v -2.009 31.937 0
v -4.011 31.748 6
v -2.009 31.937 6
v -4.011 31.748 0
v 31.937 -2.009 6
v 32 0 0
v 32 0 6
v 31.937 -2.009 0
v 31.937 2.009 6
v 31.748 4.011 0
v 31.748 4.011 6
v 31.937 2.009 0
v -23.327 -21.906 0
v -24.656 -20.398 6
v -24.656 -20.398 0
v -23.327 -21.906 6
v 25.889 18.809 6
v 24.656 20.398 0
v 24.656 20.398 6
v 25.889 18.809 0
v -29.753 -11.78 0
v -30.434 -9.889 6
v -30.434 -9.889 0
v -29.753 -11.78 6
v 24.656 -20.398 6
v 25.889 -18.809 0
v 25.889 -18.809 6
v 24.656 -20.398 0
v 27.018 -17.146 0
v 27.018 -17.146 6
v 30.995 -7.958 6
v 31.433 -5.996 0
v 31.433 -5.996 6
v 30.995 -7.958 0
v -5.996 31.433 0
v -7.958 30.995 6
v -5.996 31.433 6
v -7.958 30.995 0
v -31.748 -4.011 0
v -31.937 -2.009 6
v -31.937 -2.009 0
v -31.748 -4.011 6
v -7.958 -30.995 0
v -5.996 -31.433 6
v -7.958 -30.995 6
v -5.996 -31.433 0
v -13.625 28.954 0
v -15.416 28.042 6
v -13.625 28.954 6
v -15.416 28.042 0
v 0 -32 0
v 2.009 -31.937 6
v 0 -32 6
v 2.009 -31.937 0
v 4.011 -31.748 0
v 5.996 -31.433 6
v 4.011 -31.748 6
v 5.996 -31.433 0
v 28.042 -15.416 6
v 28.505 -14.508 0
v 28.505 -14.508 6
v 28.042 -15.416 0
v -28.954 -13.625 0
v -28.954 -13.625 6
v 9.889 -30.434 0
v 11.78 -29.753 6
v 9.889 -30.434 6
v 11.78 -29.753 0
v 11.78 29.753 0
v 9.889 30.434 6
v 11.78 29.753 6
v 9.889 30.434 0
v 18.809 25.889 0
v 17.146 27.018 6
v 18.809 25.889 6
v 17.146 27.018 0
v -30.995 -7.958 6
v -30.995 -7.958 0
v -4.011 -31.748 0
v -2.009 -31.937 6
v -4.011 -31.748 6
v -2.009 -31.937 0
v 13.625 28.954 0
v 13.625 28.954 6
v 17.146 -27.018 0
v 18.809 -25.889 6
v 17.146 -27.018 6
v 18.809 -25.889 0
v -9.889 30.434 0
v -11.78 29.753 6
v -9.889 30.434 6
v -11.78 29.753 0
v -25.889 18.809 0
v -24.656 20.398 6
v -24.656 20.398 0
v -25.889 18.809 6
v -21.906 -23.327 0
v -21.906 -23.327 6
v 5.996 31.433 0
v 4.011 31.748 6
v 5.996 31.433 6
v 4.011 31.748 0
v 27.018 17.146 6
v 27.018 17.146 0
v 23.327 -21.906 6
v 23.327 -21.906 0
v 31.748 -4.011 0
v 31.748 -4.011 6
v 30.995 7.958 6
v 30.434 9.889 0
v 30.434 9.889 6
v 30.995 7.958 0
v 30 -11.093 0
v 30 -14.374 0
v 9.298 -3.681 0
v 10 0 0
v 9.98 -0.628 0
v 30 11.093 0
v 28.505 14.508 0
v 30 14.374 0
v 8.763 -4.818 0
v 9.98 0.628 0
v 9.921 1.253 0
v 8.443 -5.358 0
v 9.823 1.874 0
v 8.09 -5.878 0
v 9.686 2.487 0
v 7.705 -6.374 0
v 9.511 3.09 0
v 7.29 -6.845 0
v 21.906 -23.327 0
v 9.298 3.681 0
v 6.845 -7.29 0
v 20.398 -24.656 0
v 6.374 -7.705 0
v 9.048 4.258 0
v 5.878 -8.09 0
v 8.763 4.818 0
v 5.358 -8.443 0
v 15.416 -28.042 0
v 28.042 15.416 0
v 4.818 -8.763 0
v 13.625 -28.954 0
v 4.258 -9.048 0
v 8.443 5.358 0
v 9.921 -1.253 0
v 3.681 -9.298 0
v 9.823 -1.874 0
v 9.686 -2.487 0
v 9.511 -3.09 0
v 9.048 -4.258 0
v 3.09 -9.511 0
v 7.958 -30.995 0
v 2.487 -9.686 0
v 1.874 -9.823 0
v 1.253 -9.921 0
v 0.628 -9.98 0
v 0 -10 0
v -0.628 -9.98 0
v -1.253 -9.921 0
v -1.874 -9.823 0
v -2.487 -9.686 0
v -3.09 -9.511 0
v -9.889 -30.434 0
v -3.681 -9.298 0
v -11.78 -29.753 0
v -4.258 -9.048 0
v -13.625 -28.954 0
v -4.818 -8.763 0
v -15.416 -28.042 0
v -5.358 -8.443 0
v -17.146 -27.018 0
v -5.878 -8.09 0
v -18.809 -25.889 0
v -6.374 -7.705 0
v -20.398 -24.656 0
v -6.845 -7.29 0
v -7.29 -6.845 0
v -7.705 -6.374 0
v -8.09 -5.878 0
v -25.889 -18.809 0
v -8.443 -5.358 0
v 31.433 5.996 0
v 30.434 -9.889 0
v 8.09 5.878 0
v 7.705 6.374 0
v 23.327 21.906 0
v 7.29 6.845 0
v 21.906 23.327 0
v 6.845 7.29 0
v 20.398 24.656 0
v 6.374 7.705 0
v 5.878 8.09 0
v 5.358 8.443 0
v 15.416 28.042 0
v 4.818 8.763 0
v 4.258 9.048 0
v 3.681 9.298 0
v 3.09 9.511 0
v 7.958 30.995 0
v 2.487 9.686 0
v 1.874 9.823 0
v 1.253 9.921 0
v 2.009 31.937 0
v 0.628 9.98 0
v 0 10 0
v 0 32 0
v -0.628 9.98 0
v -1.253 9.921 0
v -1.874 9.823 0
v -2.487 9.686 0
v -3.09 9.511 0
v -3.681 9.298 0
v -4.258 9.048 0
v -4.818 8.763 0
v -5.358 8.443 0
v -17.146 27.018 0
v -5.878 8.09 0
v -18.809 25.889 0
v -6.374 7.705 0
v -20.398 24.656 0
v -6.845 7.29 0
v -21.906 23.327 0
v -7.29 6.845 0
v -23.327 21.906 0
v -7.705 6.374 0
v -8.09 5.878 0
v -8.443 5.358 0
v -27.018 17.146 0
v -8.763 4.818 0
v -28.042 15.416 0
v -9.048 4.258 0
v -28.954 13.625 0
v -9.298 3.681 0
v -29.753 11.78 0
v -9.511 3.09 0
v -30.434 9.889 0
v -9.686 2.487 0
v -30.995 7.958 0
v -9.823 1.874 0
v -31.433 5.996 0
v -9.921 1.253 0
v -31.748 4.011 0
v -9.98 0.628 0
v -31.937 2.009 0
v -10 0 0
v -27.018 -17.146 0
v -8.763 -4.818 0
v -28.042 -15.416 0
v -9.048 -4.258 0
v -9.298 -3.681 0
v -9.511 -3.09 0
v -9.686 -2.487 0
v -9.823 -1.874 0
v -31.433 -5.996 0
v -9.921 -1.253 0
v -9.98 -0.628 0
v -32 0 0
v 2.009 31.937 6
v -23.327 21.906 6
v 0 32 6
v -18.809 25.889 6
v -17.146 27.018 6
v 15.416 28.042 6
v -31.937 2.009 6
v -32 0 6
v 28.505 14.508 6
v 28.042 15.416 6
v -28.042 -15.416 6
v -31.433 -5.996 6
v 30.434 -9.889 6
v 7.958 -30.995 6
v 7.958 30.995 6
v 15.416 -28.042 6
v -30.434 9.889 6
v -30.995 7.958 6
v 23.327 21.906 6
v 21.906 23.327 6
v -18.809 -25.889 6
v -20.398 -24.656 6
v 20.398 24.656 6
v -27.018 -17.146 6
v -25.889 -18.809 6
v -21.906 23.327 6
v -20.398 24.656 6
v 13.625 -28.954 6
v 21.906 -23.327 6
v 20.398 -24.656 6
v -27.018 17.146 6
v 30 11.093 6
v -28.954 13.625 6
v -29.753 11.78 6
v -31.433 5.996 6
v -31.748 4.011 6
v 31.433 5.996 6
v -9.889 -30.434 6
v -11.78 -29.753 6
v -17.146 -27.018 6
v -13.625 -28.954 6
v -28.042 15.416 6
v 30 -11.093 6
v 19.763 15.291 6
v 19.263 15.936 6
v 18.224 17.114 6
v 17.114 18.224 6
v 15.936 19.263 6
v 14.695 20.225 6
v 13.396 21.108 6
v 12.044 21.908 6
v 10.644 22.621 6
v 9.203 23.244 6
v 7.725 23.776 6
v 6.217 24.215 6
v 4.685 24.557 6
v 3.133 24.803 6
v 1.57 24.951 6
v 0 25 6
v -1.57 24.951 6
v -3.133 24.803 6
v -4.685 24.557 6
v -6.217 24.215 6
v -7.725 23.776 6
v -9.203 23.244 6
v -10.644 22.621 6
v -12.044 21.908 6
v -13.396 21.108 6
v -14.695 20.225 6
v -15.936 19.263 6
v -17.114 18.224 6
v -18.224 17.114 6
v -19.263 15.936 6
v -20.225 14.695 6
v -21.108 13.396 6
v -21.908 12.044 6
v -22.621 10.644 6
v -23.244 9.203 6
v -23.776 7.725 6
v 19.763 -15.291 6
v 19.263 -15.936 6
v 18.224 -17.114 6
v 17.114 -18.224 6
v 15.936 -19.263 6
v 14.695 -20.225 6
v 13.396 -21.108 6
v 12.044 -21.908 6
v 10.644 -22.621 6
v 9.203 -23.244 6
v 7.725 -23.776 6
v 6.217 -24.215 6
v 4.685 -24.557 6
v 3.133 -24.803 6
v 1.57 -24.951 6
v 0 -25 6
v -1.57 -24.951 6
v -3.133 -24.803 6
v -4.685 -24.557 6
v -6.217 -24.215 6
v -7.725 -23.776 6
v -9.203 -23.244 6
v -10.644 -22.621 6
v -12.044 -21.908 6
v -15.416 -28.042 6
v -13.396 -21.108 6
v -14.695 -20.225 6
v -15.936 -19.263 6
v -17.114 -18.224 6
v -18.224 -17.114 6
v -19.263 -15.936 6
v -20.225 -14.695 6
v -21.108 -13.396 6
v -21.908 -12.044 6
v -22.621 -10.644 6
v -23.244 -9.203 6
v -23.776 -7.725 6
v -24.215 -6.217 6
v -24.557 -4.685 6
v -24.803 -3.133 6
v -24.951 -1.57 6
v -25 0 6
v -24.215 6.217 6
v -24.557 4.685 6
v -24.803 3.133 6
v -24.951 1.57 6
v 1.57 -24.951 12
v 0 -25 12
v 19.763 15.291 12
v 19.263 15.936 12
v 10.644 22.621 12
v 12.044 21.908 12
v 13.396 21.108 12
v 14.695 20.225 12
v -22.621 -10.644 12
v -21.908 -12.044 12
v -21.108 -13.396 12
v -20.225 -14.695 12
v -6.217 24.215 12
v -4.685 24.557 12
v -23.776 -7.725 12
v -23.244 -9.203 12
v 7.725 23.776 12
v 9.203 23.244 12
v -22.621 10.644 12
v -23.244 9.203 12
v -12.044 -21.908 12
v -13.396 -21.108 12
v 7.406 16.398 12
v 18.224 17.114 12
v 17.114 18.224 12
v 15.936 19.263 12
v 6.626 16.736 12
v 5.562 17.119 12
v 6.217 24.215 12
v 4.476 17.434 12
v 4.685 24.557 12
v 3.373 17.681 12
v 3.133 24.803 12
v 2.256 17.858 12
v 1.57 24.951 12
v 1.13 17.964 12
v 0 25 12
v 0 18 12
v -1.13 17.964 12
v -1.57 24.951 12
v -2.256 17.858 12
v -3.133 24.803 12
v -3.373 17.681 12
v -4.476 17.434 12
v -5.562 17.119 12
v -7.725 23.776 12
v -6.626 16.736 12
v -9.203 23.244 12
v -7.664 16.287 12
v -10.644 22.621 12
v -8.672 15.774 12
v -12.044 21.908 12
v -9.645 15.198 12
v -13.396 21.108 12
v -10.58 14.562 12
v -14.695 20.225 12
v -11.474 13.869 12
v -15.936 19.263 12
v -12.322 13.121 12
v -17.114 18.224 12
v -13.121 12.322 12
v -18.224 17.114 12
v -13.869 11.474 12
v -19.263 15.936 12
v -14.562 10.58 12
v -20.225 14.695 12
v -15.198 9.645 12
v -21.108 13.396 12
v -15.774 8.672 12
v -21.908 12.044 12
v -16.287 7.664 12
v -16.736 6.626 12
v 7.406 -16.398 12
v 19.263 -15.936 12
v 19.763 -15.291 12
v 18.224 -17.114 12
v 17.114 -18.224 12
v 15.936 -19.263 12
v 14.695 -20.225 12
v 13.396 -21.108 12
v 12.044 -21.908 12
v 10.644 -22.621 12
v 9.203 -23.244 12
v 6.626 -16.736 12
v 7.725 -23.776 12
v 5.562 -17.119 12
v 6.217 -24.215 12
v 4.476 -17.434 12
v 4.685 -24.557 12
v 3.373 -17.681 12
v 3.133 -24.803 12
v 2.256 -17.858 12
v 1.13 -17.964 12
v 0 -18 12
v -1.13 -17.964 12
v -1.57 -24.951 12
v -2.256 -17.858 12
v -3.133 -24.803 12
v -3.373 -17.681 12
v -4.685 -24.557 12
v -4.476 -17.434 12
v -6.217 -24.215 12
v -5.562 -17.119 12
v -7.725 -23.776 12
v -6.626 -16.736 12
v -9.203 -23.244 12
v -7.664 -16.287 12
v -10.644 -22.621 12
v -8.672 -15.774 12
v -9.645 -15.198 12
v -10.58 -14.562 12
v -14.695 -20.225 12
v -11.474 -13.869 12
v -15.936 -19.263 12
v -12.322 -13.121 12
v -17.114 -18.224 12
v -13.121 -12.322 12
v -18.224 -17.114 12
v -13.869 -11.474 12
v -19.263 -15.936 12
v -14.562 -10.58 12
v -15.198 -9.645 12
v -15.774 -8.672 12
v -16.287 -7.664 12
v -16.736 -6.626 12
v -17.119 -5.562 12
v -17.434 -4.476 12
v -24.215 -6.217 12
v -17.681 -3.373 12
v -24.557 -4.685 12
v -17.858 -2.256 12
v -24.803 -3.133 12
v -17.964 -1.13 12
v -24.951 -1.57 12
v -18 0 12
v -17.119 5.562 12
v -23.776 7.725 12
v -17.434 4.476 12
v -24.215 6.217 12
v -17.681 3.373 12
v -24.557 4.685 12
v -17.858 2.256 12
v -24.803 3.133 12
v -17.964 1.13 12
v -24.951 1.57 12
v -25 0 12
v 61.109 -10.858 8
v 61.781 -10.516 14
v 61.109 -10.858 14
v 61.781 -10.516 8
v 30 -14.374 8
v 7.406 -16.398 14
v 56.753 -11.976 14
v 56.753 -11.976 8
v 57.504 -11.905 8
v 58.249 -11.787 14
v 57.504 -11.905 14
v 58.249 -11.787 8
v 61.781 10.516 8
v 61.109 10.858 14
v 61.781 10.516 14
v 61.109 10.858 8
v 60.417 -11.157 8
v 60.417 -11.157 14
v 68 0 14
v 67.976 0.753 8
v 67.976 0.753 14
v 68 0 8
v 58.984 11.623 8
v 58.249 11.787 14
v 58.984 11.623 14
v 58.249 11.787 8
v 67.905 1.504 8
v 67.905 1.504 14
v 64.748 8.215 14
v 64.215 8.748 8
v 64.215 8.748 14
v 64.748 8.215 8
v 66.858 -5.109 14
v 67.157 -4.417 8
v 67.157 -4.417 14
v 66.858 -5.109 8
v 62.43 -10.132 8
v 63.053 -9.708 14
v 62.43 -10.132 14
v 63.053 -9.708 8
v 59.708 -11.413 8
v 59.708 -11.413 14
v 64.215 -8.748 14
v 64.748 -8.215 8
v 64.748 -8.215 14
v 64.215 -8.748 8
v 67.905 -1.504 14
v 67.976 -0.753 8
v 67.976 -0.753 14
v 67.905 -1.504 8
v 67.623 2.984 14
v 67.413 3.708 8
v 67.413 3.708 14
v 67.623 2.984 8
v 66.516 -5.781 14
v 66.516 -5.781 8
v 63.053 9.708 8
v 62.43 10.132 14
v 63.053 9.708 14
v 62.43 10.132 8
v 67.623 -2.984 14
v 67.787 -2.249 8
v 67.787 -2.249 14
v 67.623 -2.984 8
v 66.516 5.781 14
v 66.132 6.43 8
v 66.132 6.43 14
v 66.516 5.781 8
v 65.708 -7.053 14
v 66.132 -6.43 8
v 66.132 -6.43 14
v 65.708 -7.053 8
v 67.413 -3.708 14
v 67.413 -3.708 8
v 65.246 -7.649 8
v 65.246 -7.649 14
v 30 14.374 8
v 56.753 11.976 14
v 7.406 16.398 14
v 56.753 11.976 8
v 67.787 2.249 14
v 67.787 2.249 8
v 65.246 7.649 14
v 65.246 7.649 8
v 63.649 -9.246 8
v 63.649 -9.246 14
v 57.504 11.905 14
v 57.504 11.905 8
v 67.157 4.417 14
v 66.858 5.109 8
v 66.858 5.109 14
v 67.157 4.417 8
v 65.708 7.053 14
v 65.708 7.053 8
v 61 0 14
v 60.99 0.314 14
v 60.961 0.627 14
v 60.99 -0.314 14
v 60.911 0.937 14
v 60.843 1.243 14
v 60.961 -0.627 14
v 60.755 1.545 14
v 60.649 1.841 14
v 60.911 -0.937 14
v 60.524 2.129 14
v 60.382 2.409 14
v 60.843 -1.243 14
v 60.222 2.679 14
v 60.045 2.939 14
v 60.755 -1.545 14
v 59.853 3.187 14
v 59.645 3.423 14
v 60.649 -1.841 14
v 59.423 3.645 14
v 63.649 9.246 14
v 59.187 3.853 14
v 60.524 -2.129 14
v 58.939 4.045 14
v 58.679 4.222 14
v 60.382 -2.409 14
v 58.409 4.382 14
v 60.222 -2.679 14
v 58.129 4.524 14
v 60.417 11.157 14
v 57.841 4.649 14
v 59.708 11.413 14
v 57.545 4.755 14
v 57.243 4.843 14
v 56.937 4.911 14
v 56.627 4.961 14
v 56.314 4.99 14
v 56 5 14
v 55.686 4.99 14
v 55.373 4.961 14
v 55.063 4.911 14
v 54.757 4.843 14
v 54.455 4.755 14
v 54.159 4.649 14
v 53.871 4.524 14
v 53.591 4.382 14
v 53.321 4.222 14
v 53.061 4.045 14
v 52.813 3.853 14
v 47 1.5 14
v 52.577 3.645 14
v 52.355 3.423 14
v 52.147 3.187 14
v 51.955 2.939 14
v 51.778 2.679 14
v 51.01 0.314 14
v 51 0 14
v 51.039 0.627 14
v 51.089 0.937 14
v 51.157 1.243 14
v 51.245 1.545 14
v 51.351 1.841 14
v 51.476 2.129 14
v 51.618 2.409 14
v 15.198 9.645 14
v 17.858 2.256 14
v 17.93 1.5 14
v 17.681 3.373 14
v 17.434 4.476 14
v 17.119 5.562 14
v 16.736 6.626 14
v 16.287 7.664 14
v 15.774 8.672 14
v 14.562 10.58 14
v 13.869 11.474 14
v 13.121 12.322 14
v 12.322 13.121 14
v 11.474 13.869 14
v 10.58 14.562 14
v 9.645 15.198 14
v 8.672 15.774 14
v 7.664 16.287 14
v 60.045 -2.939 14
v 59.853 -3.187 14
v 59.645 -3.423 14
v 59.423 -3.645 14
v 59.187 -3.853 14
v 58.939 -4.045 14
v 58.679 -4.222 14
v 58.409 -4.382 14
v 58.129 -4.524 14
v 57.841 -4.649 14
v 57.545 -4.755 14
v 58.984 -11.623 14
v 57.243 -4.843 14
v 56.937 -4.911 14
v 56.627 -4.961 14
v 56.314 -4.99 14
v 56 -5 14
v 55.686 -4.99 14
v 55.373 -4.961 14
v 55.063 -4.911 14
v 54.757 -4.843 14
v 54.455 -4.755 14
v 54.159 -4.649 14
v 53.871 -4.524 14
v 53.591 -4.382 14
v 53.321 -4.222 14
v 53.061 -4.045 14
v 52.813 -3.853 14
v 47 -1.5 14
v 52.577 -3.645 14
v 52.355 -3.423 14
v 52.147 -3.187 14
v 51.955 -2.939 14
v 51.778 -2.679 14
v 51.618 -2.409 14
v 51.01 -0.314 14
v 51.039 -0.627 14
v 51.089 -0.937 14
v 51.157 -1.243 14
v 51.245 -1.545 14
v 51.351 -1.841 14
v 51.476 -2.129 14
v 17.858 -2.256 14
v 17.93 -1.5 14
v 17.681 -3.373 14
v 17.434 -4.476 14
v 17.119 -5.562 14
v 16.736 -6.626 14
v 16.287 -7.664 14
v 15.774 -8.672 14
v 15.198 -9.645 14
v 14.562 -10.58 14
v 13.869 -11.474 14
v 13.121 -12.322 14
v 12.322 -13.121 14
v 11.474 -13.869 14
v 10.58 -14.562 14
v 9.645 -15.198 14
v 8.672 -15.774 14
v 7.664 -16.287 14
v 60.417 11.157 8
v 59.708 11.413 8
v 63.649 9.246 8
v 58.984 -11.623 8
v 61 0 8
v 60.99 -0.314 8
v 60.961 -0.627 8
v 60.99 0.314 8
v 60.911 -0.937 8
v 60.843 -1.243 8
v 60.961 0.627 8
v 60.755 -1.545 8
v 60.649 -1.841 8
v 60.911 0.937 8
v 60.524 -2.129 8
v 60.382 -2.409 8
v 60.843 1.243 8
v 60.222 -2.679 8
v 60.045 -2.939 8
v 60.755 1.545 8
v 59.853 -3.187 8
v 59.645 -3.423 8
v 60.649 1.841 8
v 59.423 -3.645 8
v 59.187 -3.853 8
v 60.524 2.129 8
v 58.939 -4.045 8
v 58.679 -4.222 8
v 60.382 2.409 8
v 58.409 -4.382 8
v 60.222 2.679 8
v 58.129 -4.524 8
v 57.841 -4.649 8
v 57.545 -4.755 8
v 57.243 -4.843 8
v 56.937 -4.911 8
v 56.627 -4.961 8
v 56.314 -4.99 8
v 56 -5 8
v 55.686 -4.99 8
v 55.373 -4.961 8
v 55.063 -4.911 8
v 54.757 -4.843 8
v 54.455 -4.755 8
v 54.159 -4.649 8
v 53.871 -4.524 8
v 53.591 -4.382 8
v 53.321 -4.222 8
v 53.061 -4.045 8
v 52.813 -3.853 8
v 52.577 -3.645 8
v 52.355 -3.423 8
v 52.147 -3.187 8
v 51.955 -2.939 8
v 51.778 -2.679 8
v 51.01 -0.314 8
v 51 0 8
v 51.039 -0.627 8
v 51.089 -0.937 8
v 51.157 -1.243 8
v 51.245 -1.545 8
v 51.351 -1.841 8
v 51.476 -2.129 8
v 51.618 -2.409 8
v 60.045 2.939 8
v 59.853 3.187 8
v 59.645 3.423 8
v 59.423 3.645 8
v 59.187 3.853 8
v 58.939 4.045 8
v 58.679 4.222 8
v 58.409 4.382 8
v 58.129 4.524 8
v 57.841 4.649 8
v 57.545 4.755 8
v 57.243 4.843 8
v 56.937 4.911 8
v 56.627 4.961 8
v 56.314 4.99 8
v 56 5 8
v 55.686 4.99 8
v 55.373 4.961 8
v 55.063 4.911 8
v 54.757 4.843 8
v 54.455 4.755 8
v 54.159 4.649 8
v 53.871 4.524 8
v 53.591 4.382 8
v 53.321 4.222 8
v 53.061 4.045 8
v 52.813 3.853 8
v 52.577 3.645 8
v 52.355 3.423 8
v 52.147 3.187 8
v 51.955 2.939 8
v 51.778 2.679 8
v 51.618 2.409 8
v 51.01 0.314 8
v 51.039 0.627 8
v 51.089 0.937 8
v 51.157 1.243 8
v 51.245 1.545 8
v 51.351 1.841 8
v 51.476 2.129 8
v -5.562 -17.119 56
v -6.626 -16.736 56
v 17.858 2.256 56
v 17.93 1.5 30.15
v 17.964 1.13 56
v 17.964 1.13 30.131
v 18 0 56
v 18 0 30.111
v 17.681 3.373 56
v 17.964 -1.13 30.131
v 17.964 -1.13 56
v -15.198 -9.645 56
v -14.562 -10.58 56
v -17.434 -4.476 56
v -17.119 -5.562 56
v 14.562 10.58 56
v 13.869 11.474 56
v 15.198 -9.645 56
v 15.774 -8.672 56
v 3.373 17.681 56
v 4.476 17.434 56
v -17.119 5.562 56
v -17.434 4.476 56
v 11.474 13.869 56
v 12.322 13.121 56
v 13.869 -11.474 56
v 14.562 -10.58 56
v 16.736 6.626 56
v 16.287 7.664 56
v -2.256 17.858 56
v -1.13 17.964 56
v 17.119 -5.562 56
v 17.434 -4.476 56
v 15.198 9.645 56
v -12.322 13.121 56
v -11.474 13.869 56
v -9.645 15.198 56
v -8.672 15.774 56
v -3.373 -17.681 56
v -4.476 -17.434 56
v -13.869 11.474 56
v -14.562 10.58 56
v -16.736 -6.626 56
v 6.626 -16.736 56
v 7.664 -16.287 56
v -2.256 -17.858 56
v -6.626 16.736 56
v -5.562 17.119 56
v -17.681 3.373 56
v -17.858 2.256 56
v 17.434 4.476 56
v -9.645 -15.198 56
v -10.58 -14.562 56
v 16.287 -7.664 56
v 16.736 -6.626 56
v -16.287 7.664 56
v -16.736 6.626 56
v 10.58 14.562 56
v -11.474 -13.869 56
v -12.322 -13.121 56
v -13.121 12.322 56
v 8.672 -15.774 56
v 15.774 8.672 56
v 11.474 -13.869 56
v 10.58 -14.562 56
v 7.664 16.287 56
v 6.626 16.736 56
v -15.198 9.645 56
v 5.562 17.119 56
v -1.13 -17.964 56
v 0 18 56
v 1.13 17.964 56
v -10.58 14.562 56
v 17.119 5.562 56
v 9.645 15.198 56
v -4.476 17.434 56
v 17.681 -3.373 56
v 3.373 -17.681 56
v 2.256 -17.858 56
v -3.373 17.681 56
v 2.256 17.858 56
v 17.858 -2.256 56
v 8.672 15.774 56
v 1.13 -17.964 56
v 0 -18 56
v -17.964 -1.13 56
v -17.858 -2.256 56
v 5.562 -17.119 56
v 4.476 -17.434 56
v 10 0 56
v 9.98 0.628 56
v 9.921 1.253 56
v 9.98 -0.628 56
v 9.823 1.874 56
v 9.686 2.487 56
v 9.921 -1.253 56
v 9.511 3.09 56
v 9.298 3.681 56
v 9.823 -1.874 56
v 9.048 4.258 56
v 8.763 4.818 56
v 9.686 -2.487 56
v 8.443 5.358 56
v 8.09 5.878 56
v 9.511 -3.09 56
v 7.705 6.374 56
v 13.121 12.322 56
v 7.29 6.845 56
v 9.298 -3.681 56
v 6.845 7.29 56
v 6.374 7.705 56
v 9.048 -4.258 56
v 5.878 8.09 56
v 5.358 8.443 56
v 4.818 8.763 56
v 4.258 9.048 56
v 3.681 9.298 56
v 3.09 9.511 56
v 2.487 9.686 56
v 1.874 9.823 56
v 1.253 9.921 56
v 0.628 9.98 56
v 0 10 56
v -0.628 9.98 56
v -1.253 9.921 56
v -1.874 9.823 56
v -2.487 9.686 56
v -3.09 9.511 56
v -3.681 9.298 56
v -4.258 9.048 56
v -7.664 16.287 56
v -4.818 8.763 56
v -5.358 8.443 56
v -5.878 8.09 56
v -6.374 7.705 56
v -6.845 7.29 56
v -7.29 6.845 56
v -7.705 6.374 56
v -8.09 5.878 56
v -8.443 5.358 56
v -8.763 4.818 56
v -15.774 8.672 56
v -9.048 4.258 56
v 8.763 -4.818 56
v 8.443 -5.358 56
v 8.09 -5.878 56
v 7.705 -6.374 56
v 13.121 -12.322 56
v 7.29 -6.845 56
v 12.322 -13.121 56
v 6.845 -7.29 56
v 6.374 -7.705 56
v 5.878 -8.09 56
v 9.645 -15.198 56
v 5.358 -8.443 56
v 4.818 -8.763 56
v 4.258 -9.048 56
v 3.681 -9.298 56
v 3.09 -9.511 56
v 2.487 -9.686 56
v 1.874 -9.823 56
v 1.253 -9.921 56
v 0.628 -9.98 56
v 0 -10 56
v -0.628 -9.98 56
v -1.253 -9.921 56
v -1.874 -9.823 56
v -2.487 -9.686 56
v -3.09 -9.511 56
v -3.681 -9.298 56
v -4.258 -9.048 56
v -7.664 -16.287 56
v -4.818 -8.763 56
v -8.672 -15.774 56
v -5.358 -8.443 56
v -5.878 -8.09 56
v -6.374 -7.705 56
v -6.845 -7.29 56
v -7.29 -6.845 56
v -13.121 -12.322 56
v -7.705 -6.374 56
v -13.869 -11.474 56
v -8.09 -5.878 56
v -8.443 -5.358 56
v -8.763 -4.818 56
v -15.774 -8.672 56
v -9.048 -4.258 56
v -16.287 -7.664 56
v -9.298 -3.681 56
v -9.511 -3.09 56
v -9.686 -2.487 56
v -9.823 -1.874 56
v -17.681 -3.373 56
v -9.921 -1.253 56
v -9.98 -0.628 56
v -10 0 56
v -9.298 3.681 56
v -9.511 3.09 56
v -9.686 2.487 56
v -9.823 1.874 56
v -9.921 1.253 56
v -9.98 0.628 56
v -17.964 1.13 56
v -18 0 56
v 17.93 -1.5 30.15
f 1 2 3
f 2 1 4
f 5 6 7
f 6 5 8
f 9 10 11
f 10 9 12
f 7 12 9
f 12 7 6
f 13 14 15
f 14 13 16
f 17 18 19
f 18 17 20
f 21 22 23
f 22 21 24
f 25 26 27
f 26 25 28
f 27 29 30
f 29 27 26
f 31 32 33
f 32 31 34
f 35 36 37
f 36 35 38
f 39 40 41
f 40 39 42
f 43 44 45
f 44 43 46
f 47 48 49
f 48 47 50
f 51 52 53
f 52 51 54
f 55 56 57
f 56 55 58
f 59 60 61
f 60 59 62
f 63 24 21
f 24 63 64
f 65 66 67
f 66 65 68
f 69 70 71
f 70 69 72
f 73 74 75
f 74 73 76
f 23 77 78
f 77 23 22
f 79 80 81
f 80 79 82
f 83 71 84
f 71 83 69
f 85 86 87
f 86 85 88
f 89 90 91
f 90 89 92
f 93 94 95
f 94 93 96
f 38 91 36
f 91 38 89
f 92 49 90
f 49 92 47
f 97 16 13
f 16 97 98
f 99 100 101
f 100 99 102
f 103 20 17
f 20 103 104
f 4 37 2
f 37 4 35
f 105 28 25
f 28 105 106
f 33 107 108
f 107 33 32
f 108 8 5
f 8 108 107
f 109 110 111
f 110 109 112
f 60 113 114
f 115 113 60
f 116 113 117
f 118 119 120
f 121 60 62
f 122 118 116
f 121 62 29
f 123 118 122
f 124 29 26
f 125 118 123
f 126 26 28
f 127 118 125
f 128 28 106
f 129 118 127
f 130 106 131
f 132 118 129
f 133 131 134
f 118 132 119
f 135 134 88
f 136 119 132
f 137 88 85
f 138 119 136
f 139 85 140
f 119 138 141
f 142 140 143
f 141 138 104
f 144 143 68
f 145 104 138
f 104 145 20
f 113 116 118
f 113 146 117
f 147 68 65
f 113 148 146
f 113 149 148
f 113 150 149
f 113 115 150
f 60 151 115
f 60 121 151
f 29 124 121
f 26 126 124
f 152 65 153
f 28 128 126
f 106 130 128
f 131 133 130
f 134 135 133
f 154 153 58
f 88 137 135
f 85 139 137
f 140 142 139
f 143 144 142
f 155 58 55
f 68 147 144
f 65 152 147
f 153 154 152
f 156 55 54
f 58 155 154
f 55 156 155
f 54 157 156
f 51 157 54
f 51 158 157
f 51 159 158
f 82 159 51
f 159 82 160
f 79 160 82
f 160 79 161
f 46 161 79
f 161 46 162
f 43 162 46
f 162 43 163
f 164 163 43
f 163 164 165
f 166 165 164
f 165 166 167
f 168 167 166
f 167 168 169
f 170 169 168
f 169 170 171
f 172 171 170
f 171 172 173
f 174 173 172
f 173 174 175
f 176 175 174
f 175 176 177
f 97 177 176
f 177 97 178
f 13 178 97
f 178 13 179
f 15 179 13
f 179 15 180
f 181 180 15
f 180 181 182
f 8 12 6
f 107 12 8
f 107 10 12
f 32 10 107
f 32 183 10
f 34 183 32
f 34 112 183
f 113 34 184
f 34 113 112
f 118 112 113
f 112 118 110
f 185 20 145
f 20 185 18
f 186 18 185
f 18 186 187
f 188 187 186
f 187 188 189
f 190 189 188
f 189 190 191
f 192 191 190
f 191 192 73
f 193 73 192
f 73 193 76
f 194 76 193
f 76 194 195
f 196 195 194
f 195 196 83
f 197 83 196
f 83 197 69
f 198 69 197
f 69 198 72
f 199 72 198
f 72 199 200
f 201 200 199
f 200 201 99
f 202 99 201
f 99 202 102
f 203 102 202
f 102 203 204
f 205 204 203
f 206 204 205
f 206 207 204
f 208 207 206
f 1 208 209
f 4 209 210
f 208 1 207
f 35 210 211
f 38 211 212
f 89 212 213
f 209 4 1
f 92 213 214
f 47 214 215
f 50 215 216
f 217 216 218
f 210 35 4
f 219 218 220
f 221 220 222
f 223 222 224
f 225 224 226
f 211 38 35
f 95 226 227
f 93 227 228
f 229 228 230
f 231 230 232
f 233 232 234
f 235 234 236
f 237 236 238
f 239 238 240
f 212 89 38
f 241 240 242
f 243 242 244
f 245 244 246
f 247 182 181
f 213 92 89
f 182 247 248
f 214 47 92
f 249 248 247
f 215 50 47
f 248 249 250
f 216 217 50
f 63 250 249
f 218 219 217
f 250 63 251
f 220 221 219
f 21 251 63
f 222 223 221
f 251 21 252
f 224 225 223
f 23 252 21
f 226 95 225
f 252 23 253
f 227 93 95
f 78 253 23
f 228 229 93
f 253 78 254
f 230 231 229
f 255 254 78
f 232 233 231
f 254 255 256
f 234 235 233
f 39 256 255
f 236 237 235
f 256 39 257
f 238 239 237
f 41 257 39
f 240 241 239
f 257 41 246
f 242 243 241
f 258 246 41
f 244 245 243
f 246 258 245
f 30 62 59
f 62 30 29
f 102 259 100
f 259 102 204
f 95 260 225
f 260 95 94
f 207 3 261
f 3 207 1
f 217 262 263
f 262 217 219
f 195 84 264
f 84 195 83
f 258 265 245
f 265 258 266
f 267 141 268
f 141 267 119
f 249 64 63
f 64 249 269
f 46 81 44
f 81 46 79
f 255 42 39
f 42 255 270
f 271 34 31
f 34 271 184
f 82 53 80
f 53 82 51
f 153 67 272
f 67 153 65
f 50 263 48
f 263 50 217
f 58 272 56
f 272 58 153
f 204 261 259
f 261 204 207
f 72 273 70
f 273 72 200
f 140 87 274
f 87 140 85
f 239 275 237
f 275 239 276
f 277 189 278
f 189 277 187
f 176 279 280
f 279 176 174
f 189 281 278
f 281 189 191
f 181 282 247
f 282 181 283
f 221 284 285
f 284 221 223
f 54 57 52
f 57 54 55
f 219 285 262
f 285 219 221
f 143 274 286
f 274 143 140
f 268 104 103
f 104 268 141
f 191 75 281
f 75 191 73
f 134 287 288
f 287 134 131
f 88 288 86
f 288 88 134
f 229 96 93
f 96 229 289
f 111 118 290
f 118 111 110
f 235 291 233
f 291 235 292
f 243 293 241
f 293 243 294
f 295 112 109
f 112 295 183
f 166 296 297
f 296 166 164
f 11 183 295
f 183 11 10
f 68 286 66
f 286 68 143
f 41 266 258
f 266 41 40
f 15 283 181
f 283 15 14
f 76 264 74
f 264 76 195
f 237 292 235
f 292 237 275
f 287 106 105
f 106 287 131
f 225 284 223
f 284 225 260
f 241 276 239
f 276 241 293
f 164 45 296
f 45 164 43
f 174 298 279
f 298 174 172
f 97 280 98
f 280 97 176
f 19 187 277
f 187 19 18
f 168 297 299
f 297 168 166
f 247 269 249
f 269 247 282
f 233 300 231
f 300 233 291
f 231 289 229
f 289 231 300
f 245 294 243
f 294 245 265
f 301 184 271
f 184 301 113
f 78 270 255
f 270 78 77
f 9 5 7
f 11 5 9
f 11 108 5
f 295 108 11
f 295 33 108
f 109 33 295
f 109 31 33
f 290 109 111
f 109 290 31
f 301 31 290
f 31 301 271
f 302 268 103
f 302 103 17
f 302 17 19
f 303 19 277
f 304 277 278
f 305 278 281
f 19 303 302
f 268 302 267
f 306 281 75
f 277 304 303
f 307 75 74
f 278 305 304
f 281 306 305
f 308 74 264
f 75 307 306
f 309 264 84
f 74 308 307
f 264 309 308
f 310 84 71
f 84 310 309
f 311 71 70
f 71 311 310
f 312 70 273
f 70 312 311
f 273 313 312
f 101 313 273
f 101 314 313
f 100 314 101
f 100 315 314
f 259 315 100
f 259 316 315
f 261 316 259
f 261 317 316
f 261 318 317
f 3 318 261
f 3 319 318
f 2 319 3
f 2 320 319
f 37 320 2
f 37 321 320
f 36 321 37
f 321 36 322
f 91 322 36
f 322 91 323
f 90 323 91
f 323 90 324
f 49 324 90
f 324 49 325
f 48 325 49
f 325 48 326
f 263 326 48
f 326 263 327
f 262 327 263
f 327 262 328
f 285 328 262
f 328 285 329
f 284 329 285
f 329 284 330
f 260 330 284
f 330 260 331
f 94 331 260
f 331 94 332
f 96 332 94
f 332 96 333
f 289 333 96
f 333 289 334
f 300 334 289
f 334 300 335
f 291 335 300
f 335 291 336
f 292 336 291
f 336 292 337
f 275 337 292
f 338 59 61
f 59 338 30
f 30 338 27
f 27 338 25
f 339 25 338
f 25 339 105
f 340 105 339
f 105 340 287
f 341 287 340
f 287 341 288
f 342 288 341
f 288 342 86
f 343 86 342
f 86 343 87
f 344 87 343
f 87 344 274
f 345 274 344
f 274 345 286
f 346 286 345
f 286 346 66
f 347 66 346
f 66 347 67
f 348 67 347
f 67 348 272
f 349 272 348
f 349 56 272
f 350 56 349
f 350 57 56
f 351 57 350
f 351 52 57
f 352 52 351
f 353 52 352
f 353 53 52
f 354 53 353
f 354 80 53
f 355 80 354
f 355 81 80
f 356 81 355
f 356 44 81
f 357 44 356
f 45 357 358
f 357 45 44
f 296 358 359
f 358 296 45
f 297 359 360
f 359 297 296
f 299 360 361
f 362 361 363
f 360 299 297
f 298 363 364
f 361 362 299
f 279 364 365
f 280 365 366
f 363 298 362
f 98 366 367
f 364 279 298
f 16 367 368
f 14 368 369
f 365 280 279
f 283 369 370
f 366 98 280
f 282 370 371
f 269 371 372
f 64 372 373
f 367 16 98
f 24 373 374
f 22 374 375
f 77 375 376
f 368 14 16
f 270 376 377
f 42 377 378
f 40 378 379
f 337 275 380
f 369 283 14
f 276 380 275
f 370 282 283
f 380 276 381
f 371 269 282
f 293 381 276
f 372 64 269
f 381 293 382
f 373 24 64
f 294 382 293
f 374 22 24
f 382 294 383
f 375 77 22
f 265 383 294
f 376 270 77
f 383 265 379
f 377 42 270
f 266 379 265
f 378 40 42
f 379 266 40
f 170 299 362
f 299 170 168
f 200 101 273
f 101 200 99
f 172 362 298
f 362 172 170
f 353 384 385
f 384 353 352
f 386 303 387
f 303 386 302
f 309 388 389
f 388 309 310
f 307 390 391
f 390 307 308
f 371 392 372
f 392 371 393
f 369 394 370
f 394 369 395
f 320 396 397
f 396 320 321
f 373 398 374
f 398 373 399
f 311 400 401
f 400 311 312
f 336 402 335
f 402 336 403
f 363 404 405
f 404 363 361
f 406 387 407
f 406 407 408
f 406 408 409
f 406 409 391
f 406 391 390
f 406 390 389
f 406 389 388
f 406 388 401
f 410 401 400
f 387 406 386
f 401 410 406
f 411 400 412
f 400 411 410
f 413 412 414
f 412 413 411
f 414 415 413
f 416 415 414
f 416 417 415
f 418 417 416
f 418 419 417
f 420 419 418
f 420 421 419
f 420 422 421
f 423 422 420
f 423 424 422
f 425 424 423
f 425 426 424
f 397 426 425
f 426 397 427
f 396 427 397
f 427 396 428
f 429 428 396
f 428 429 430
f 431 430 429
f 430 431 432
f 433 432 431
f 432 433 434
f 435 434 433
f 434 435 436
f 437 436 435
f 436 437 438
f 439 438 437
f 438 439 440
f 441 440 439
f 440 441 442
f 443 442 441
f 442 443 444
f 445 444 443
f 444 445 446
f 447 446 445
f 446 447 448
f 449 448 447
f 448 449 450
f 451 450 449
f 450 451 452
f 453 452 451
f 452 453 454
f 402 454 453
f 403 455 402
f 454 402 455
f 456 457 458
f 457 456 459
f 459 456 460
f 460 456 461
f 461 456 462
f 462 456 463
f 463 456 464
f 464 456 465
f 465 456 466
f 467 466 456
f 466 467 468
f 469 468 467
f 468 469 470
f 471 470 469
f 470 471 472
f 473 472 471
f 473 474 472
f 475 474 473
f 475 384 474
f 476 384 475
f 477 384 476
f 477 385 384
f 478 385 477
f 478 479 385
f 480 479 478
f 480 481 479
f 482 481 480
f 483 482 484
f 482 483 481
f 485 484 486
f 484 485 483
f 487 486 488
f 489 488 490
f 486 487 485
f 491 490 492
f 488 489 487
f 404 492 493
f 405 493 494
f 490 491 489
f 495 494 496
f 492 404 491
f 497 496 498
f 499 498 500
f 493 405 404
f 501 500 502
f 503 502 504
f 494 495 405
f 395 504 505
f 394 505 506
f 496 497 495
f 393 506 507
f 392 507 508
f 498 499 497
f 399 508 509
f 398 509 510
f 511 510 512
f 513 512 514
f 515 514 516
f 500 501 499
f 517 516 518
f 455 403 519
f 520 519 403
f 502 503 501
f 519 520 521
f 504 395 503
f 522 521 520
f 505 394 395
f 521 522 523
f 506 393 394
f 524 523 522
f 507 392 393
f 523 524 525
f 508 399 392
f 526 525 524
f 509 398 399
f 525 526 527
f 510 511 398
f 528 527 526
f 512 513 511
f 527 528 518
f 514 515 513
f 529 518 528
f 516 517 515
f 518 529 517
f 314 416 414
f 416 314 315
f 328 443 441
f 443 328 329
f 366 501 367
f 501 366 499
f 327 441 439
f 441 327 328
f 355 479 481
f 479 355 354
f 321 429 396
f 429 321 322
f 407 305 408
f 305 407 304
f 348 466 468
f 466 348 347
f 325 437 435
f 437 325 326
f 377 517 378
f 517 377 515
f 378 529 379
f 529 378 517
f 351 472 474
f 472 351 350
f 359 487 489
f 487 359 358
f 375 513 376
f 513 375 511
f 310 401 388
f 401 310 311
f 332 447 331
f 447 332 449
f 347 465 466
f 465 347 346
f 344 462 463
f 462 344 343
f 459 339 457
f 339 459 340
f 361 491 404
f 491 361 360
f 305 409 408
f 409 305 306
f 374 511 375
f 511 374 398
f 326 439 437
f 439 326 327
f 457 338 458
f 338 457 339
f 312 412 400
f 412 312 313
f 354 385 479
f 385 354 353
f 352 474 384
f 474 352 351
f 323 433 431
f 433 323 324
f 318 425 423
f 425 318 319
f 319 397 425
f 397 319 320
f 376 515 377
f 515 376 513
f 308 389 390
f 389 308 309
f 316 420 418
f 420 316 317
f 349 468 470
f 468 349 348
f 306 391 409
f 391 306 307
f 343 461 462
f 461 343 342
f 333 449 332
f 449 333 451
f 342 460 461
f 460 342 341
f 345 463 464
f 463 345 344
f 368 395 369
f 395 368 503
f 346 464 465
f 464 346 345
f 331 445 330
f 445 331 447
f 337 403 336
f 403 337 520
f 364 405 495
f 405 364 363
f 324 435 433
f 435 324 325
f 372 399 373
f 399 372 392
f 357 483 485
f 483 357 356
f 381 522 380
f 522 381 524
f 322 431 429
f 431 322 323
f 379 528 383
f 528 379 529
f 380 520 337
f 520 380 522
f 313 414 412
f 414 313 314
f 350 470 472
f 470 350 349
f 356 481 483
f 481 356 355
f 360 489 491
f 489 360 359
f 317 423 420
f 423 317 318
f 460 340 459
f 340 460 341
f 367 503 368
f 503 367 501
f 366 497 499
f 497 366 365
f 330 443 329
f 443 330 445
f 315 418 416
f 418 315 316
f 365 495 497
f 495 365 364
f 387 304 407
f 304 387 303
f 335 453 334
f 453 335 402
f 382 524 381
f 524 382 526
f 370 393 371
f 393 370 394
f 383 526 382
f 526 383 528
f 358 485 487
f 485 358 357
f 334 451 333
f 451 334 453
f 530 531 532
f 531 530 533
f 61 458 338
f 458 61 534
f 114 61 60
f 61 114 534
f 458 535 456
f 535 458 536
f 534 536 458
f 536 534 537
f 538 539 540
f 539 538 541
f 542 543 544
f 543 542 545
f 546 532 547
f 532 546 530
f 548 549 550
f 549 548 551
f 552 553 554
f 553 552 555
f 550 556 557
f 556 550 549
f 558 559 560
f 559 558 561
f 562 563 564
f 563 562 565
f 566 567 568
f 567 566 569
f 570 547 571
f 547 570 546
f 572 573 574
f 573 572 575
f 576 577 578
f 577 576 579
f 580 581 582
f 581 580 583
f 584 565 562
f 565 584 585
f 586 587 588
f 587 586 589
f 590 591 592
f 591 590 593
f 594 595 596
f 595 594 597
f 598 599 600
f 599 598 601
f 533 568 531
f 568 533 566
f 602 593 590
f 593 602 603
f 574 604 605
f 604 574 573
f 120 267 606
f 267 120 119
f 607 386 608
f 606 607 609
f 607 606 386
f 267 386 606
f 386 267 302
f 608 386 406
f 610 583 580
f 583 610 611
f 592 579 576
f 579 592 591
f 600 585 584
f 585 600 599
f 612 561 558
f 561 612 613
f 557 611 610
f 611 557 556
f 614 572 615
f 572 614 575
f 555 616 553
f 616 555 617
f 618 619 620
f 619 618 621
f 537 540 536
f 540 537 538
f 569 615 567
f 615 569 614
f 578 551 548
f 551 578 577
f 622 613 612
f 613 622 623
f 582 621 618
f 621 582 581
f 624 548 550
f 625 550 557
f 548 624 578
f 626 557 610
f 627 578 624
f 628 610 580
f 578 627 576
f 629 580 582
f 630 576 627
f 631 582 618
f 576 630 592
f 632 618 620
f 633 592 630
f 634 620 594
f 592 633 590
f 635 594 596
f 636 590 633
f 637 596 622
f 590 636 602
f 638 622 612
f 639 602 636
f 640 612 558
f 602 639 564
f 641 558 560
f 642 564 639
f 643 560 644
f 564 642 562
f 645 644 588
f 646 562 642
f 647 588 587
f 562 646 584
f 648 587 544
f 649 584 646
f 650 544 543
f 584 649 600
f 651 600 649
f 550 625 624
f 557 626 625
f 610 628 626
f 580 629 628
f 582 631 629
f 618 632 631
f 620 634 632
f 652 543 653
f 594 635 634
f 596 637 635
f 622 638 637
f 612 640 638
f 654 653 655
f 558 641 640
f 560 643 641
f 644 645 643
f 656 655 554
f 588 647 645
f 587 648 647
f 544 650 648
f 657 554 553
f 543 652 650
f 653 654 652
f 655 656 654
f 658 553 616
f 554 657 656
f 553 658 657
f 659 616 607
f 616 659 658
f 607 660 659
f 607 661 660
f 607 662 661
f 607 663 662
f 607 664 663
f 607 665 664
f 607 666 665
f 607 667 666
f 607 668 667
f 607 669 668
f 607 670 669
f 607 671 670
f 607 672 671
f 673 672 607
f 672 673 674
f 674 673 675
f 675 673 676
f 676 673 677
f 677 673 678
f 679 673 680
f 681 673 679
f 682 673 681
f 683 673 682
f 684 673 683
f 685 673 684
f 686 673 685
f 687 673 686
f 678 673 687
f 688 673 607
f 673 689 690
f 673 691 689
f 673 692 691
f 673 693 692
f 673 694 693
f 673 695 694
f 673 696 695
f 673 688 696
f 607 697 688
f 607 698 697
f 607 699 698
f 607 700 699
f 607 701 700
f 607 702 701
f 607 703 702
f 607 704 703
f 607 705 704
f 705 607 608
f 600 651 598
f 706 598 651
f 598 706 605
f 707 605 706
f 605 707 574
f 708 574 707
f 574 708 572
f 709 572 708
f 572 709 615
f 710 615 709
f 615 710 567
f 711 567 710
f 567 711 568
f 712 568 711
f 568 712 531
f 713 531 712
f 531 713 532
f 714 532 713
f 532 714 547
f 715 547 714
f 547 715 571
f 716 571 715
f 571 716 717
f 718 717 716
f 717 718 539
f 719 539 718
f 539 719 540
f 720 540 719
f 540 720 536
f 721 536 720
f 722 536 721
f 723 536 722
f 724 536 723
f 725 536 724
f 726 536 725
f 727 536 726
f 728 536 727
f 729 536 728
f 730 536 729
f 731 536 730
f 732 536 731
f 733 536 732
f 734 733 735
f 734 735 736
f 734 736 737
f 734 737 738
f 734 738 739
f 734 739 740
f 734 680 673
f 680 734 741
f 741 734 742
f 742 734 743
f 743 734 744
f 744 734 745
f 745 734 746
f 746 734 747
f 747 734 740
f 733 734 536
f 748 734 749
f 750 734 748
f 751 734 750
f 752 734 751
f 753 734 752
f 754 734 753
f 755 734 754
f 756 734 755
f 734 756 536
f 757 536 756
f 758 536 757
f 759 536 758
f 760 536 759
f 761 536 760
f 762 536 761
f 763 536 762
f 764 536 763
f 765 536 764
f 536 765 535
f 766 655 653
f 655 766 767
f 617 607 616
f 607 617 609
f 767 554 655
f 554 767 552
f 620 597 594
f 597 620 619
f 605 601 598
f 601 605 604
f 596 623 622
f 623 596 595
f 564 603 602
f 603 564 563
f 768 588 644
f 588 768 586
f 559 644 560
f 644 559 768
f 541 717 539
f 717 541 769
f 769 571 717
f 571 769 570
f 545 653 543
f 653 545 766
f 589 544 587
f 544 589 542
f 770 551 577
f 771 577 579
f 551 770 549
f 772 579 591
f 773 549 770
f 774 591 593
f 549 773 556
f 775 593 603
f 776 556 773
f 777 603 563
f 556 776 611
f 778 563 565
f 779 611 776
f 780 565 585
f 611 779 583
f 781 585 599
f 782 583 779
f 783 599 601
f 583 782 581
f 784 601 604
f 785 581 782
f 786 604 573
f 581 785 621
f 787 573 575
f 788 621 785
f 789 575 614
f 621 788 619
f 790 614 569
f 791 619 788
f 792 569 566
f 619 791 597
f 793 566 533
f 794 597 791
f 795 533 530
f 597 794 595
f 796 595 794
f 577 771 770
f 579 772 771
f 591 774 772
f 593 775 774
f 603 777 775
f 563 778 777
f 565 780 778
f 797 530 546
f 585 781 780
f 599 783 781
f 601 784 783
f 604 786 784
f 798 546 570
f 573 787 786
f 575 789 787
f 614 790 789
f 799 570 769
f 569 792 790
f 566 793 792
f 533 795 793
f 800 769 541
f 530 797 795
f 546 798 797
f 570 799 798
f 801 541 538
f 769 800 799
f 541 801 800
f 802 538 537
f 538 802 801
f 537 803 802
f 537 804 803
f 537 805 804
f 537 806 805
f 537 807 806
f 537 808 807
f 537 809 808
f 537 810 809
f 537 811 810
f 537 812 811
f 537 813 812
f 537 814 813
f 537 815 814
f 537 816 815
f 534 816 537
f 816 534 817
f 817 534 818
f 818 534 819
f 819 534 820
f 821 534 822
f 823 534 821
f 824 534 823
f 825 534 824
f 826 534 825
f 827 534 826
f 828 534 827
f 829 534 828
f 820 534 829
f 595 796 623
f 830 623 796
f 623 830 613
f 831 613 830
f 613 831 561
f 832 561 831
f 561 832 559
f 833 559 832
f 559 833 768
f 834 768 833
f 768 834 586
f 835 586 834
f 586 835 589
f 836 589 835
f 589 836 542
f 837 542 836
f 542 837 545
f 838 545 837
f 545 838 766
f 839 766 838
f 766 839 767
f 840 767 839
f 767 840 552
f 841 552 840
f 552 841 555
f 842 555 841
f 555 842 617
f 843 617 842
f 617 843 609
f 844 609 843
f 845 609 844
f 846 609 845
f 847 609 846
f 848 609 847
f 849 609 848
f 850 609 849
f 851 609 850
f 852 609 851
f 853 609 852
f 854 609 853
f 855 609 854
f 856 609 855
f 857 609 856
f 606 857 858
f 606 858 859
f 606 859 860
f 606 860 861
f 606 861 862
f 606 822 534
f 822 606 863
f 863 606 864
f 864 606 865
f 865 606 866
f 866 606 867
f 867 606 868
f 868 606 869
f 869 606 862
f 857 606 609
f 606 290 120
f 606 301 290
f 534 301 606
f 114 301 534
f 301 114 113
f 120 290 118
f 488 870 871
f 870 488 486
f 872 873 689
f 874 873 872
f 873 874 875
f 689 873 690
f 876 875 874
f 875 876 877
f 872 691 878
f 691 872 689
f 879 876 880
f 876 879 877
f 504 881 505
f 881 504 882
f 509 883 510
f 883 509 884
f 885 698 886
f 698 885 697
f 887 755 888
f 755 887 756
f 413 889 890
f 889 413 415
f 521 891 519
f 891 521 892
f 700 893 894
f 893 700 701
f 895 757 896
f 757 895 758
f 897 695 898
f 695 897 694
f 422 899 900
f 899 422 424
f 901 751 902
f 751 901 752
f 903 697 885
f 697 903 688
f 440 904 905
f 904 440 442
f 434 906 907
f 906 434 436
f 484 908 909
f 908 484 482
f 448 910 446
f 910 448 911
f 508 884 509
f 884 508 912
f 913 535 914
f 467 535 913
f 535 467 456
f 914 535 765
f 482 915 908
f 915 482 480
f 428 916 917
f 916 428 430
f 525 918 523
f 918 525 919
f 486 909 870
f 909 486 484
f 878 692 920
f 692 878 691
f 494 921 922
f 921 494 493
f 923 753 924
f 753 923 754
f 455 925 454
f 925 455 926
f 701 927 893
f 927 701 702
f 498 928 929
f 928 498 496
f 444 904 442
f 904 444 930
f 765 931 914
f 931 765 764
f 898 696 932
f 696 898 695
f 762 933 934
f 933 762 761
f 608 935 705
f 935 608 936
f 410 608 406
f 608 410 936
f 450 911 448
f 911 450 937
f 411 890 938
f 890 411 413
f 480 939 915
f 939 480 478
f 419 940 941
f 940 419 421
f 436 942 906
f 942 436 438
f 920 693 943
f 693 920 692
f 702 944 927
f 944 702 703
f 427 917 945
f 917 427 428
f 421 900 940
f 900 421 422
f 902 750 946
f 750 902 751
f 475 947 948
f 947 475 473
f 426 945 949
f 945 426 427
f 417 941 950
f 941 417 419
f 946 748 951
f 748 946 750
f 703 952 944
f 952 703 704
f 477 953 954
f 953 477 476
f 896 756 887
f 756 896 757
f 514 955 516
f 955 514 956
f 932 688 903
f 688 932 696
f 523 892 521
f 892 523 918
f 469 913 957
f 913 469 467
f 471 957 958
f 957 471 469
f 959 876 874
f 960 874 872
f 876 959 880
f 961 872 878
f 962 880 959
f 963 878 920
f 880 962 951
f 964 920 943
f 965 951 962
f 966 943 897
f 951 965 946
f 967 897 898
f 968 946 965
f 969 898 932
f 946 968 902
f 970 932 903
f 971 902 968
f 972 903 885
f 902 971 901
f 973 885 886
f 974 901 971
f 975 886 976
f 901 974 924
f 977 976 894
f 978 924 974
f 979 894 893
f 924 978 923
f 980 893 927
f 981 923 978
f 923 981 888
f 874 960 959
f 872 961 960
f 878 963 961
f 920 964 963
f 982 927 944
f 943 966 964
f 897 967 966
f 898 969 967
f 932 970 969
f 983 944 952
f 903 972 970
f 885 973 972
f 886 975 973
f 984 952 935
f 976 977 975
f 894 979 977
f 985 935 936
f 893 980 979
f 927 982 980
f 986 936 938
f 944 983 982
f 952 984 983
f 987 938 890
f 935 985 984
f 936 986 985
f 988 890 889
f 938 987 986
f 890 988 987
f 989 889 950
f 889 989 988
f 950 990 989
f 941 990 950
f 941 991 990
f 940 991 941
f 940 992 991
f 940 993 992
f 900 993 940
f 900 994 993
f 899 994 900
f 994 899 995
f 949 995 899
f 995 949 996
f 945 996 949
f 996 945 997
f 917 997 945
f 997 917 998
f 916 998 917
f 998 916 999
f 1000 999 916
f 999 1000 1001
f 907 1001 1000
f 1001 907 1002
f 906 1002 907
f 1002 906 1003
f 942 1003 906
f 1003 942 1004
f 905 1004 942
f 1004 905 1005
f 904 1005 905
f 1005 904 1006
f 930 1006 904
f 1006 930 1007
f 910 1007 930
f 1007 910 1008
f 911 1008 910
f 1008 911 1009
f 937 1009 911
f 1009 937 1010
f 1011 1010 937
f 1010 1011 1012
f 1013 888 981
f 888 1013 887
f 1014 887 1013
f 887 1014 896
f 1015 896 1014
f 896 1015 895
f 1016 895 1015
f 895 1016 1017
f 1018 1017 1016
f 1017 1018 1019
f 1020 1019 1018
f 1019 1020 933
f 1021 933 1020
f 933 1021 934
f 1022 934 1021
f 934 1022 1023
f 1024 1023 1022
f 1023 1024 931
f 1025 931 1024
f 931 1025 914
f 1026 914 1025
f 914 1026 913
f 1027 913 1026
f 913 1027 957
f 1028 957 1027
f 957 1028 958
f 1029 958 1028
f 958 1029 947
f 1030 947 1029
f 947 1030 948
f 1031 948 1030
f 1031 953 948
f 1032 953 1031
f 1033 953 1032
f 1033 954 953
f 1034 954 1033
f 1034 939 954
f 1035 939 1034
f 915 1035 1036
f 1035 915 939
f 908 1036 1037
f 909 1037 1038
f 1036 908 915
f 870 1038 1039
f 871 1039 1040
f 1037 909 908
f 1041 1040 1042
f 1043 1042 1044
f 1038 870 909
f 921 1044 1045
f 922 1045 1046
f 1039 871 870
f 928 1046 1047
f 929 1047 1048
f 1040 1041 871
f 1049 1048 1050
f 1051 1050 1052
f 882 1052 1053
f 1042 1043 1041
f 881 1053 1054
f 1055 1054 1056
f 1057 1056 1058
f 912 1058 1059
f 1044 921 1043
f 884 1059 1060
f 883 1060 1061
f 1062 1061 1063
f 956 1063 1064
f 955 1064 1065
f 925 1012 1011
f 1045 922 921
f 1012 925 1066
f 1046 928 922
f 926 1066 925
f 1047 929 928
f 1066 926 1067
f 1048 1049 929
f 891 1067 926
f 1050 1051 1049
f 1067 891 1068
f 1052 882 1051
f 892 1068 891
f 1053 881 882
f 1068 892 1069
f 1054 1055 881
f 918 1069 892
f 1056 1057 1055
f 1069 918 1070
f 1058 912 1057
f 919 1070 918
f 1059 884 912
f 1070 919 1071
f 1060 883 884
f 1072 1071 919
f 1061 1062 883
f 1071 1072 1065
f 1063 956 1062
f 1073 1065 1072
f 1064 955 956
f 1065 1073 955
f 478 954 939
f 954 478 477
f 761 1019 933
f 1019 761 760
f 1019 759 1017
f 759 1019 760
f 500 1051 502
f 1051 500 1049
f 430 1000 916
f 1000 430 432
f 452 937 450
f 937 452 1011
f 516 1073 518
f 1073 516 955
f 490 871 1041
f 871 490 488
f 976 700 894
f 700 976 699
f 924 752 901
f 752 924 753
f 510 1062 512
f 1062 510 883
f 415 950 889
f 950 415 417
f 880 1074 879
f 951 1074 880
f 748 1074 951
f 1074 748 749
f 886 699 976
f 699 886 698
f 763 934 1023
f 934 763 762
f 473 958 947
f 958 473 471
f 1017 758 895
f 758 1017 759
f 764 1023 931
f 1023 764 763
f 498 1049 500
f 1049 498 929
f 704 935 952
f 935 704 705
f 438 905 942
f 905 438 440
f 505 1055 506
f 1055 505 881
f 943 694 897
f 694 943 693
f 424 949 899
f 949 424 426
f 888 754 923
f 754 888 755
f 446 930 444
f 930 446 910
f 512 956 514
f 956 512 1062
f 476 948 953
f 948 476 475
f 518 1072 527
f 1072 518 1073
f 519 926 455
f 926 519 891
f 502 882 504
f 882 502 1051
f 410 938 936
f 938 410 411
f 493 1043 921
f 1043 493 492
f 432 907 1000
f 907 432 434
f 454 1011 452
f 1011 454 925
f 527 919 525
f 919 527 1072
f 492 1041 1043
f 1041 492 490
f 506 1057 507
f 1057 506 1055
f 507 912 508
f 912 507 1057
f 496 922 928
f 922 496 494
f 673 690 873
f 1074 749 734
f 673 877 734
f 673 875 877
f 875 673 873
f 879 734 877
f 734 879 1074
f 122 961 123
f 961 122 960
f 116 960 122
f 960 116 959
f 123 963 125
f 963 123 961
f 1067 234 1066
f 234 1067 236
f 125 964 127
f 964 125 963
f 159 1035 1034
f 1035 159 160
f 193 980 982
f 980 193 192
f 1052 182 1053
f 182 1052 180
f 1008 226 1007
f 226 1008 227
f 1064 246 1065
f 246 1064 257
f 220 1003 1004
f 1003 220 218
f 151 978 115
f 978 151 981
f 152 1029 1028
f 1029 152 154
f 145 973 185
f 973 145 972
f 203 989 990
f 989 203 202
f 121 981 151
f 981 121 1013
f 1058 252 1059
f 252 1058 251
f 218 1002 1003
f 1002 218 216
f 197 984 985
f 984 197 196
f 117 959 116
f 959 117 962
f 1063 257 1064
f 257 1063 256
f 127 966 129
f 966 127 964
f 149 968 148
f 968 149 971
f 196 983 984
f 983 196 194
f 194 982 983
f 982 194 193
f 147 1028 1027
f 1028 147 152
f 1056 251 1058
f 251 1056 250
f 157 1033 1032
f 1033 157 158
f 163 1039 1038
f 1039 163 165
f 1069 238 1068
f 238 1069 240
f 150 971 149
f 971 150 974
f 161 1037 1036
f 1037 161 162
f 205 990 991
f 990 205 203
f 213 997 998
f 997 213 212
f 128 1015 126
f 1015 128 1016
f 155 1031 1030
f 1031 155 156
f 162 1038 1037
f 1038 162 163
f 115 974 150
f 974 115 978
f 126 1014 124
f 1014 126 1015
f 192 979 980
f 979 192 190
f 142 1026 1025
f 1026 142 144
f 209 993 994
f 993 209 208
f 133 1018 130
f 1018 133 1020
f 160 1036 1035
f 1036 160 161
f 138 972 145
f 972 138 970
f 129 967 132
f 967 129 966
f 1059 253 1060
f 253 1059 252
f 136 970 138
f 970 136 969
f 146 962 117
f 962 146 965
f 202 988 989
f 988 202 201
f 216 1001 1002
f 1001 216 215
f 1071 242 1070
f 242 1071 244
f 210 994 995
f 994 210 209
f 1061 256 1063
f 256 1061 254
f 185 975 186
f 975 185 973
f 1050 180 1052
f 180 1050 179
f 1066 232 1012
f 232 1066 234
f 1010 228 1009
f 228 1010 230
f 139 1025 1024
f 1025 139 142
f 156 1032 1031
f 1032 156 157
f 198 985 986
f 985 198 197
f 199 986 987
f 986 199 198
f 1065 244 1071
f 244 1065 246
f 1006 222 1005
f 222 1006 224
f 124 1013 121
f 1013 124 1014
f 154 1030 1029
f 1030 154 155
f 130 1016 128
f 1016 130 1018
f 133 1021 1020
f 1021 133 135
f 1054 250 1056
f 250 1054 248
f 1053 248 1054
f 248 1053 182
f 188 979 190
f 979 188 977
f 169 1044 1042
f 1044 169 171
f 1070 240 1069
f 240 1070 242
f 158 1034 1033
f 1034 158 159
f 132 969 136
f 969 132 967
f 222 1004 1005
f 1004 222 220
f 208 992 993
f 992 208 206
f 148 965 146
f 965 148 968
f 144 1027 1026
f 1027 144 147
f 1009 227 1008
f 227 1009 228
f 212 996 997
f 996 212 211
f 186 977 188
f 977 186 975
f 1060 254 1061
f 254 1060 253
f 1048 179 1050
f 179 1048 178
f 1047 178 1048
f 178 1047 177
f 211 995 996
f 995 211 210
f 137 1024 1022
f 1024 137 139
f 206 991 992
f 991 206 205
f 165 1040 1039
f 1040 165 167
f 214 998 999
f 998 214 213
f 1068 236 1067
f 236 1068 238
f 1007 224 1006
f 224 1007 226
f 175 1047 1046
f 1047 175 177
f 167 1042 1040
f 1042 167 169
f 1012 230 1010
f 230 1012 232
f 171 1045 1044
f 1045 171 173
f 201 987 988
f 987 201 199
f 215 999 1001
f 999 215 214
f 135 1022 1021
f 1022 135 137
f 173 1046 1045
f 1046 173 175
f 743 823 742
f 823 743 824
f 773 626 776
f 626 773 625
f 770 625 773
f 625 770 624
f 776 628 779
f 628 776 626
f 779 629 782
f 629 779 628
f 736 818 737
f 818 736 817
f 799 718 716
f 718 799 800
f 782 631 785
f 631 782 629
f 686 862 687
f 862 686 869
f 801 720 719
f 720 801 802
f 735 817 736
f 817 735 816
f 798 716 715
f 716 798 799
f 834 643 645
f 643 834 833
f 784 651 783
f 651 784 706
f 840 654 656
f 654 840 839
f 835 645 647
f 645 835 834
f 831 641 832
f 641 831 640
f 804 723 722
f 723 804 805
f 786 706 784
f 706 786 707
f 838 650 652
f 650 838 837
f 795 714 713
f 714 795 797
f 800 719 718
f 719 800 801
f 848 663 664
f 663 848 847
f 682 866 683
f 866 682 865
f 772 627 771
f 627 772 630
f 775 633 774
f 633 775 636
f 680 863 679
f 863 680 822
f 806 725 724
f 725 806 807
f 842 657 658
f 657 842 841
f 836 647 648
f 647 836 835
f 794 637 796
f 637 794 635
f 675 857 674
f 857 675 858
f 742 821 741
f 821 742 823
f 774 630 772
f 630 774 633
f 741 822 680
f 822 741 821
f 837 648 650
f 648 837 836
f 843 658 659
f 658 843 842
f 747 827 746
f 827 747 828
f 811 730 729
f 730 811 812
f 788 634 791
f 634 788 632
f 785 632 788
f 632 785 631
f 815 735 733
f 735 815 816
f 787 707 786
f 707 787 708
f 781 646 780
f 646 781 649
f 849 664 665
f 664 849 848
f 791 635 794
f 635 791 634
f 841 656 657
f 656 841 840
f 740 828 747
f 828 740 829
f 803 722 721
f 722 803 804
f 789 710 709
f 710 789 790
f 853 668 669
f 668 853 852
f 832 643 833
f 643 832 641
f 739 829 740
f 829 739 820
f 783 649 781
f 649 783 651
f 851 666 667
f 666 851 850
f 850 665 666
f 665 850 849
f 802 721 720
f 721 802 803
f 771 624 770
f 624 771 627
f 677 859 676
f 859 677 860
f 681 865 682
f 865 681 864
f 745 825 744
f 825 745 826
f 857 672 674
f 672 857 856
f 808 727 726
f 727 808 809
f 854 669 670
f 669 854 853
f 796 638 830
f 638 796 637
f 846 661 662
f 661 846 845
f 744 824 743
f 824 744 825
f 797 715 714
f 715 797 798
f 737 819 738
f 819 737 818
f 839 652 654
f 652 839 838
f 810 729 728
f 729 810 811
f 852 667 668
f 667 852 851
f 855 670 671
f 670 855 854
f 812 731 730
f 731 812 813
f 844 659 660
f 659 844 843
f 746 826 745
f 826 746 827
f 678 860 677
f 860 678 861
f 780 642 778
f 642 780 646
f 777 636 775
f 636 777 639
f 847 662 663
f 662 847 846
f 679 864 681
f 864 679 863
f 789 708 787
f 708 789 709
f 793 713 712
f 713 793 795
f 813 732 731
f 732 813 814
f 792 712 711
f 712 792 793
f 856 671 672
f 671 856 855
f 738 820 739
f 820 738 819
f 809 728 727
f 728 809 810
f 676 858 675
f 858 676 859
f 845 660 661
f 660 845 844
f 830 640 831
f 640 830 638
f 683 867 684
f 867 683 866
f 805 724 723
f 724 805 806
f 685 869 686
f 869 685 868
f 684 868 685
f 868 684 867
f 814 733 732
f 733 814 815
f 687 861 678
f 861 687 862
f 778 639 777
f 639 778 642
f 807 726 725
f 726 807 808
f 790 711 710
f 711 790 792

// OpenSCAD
// ============================================================
// Stepped circular base + annular sleeve + side arm + top rib
// ============================================================

$fn = 100;

// ---------- Base (low stepped circular section) ----------
base_dia = 64;   // lower flange diameter
base_h   = 6;    // lower flange height
step_dia = 50;   // upper step diameter
step_h   = 6;    // upper step height

// ---------- Sleeve (tall annular tube) ----------
sleeve_od = 36;  // sleeve outer diameter
sleeve_id = 20;  // through-bore diameter (passes through everything)
sleeve_h  = 44;  // sleeve height above the upper step

// ---------- Side arm ----------
arm_len    = 56; // sleeve axis to rounded-end center distance
arm_root_d = 34; // arm width at the base (root)
lug_r      = 12; // rounded end radius
arm_top    = 14; // arm top surface height (z)
arm_tier   = 8;  // raised underside level of the outer arm portion
step_x     = 30; // x position where the underside cutaway starts
lug_hole_d = 10; // rounded opening through the lug

// ---------- Rib (thin triangular web on top of the arm) ----------
rib_t = 3;       // rib thickness
rib_h = 20;      // rib height above the arm at the sleeve

// ---------- Derived values ----------
step_top = base_h + step_h;        // z of the upper step face
total_h  = step_top + sleeve_h;    // overall model height

// ---------------- Modules ----------------

// Low rounded base: two stepped circular discs
module base() {
    cylinder(d = base_dia, h = base_h);
    translate([0, 0, base_h])
        cylinder(d = step_dia, h = step_h);
}

// Tall sleeve body (bore subtracted later in assembly)
module sleeve() {
    translate([0, 0, step_top])
        cylinder(d = sleeve_od, h = sleeve_h);
}

// Projecting arm: tapered hull from root to rounded lug end,
// with a lower cutaway so the outer portion sits on a higher tier
module arm() {
    difference() {
        hull() {
            cylinder(d = arm_root_d, h = arm_top);           // root
            translate([arm_len, 0, 0])
                cylinder(r = lug_r, h = arm_top);            // rounded end
        }
        // Underside cutaway: removes full-depth material beyond step_x
        translate([step_x, -(arm_root_d/2 + 2), -1])
            cube([arm_len + lug_r - step_x + 2,
                  arm_root_d + 4,
                  arm_tier + 1]);
    }
}

// Thin triangular rib rising from the lug end toward the sleeve
module rib() {
    x0 = sleeve_id/2 + 1;      // root buried inside the sleeve wall
    x1 = arm_len - lug_r + 3;  // tip near the rounded end
    translate([0, rib_t/2, 0])
        rotate([90, 0, 0])     // 2D x-y profile -> x-z plane
            linear_extrude(height = rib_t)
                polygon([[x0, arm_top],
                         [x0, arm_top + rib_h],
                         [x1, arm_top]]);
}

// ---------------- Assembly ----------------

difference() {
    union() {
        base();
        sleeve();
        arm();
        rib();
    }
    // Central bore: through sleeve, step and base (not a blind pocket)
    translate([0, 0, -1])
        cylinder(d = sleeve_id, h = total_h + 2);
    // Rounded opening through the smaller arm end
    translate([arm_len, 0, -1])
        cylinder(d = lug_hole_d, h = arm_top + 2);
}
